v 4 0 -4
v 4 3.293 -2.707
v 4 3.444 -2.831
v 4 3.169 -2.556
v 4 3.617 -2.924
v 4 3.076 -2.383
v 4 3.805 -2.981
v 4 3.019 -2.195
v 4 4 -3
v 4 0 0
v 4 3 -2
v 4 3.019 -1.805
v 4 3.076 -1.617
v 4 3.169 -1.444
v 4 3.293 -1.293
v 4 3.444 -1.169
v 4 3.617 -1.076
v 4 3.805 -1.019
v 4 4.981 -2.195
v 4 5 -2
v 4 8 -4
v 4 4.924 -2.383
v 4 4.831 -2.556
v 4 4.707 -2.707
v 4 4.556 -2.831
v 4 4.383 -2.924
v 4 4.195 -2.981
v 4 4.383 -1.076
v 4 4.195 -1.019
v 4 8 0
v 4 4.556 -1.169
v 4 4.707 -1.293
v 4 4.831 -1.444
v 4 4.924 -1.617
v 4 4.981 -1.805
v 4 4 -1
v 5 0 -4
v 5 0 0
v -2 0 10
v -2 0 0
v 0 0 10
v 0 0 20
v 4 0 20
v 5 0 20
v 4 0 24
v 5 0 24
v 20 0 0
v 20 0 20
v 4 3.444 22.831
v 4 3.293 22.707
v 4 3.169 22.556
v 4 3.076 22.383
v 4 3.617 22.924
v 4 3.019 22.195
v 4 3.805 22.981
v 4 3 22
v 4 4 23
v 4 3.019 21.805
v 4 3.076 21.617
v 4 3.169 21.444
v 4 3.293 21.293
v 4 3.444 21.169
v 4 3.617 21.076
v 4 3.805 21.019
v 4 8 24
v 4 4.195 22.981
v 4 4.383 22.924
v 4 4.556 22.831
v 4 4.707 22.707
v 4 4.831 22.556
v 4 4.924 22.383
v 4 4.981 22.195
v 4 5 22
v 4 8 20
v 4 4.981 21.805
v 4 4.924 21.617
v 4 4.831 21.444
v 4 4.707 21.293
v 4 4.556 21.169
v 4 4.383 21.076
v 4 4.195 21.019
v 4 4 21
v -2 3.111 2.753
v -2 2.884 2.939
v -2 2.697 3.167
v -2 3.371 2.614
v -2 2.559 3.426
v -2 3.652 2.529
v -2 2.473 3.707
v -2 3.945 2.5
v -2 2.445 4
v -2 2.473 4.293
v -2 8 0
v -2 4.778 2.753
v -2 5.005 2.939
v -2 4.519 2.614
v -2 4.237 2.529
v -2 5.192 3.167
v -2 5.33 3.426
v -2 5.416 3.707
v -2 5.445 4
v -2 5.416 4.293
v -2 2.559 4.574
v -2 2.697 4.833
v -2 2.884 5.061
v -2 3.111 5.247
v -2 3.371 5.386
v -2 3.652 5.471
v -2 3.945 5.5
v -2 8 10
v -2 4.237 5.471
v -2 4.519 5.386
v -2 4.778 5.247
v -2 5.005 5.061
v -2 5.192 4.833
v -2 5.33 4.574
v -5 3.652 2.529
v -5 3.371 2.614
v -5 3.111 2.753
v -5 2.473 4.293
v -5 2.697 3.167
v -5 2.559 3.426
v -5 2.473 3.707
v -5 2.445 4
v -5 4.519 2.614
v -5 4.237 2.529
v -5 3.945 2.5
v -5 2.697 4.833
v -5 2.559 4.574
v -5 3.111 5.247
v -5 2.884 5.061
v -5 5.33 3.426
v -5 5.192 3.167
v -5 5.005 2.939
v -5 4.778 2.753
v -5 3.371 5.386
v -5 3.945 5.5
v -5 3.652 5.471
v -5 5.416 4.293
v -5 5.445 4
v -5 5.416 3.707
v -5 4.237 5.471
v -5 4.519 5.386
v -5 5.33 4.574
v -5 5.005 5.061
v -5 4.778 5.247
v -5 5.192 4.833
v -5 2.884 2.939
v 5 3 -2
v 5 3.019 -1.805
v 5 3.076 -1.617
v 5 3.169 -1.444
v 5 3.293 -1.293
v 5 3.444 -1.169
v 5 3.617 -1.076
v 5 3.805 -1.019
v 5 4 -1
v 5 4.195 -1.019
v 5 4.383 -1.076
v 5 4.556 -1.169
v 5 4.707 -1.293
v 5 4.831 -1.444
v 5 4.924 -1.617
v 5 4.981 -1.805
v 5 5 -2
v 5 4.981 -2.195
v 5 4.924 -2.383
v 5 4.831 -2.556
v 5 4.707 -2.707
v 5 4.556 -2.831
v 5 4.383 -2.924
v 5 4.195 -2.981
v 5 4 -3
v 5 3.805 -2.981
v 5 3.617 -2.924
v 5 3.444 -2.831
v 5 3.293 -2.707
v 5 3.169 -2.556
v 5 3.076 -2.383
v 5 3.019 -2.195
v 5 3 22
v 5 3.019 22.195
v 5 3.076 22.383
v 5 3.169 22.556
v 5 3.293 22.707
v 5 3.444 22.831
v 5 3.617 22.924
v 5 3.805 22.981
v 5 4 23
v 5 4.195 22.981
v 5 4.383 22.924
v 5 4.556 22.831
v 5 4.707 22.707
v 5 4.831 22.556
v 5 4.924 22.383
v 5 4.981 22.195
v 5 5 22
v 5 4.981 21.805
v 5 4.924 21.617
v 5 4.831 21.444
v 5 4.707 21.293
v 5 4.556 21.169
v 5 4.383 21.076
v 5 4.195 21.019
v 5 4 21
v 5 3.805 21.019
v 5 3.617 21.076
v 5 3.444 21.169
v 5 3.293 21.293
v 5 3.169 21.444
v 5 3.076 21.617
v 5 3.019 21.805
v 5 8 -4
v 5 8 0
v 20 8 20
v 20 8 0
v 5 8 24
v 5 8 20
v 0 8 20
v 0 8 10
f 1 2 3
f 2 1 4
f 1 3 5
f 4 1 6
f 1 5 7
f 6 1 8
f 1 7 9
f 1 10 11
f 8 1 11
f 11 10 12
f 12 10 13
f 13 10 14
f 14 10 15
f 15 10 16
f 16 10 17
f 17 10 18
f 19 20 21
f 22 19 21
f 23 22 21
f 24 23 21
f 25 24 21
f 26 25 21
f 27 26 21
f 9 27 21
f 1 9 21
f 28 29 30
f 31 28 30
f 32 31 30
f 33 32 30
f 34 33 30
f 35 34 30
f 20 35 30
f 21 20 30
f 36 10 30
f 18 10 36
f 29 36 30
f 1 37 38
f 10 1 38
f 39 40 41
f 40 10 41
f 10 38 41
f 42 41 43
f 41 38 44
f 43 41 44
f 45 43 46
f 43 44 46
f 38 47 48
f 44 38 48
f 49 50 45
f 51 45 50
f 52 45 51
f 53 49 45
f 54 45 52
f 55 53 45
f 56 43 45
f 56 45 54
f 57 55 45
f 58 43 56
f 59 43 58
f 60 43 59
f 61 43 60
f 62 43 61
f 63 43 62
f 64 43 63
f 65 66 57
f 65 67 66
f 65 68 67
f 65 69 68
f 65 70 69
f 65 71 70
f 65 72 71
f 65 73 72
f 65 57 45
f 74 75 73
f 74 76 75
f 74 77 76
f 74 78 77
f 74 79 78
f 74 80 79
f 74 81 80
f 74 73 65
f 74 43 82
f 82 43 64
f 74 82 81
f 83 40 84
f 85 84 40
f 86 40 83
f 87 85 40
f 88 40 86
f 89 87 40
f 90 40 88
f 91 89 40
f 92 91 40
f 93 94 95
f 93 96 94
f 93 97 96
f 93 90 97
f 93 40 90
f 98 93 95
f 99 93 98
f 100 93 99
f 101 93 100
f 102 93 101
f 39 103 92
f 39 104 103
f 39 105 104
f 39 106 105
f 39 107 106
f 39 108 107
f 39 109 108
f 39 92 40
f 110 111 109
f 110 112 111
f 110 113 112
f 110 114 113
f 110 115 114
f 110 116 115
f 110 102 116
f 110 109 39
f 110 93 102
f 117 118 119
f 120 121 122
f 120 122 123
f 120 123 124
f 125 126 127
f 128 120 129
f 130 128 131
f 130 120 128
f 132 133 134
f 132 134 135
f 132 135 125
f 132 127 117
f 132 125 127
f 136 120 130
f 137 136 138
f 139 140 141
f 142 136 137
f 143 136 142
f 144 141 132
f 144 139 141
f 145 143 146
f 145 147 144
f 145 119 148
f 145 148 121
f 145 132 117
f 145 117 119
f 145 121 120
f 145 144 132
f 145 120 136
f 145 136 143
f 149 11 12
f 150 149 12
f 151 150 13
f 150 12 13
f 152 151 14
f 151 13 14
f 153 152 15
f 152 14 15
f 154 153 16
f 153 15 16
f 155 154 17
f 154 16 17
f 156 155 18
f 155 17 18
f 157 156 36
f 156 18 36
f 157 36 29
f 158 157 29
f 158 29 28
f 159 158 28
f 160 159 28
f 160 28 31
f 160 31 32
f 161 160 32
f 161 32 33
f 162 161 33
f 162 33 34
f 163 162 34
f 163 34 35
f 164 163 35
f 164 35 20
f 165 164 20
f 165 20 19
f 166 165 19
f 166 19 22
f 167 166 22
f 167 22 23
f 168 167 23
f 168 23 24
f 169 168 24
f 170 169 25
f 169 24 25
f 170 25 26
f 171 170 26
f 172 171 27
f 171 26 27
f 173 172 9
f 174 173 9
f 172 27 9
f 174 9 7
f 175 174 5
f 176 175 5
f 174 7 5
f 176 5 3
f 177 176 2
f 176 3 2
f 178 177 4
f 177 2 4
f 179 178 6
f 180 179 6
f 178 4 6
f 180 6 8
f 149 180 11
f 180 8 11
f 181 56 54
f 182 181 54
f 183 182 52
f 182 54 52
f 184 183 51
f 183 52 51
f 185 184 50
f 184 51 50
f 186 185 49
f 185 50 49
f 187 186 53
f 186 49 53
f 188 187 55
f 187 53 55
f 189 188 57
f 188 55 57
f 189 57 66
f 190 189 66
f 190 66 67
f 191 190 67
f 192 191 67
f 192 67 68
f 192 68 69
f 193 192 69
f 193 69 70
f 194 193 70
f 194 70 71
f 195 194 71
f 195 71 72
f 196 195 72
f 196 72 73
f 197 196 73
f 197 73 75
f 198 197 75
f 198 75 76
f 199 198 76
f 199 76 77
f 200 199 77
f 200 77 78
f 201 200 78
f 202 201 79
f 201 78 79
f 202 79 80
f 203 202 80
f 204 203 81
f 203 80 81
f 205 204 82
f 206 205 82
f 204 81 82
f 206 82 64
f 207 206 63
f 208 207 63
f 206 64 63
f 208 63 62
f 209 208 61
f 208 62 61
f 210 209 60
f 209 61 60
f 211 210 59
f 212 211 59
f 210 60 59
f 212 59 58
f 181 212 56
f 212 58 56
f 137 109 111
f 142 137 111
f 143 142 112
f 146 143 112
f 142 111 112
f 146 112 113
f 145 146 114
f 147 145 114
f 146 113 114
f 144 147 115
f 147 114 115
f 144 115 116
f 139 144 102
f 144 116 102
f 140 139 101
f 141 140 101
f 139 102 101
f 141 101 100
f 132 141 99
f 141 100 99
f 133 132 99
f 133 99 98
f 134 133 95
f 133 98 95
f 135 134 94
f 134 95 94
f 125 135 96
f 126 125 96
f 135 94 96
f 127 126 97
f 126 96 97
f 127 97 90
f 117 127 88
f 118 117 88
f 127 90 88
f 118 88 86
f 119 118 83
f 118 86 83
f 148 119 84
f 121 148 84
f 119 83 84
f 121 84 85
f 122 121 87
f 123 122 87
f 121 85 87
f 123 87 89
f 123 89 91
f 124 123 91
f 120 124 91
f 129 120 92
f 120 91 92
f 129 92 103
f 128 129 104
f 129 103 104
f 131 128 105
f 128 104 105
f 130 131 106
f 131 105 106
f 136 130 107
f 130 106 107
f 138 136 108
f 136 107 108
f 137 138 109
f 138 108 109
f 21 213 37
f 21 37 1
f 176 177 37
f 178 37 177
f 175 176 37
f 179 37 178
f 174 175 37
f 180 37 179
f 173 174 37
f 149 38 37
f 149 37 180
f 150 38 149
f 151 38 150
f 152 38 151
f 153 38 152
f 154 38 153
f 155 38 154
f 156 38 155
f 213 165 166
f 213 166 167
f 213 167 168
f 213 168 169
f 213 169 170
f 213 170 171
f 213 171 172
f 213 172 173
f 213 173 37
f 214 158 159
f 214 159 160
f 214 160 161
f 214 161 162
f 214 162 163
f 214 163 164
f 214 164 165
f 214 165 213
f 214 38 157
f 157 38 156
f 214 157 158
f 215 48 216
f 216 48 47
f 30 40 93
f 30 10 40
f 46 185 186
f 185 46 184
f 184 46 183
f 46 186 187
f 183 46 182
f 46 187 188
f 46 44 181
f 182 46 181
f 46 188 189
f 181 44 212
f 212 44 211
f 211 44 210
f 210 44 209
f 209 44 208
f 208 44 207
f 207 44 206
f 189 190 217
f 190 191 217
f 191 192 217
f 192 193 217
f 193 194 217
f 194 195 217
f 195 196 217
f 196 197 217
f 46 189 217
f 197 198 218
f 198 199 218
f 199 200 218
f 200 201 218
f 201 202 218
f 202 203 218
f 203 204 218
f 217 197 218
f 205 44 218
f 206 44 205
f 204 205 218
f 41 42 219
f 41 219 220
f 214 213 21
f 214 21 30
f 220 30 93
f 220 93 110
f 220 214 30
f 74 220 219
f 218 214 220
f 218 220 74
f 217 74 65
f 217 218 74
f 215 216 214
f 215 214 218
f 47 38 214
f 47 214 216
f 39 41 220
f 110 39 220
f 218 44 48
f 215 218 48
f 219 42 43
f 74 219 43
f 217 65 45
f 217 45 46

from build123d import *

# Parameters (mm, degrees)
SKETCH1_W           = 20
SKETCH1_H           = 20
BOSS_EXTRUDE1_DEPTH = 8
SKETCH2_W           = 1
SKETCH2_H           = 8
BOSS_EXTRUDE2_DEPTH = 4
SKETCH3_W           = 1
SKETCH3_H           = 8
BOSS_EXTRUDE3_DEPTH = 4
SKETCH4_R           = 1
CUT_EXTRUDE1_DEPTH  = 4
SKETCH5_W           = 10
SKETCH5_H           = 8
BOSS_EXTRUDE4_DEPTH = 2
SKETCH6_R           = 1.5
BOSS_EXTRUDE5_DEPTH = 3


with BuildPart() as part:
    # Sketch1 → Boss-Extrude1 (new body)
    with BuildSketch(Plane(origin=(0, 0, 0), x_dir=(1, 0, 0), z_dir=(0, 1, 0))):
        with Locations((10, -10)):
            Rectangle(SKETCH1_W, SKETCH1_H)
    extrude(amount=BOSS_EXTRUDE1_DEPTH)

    # Sketch2 → Boss-Extrude2 (add)
    with BuildSketch(Plane(origin=(0, 0, 0), x_dir=(-1, 0, 0), z_dir=(0, 0, -1))):
        with Locations((-4.5, 4)):
            Rectangle(SKETCH2_W, SKETCH2_H)
    extrude(amount=BOSS_EXTRUDE2_DEPTH)

    # Sketch3 → Boss-Extrude3 (add)
    with BuildSketch(Plane.XY.offset(20)):
        with Locations((4.5, 4)):
            Rectangle(SKETCH3_W, SKETCH3_H)
    extrude(amount=BOSS_EXTRUDE3_DEPTH)

    # Sketch4 → Cut-Extrude1 (cut)
    with BuildSketch(Plane.ZY.offset(-4)):
        with Locations(Location((-2, 4, 0), (0, 0, 270))):
            Circle(SKETCH4_R)
        with Locations(Location((22, 4, 0), (0, 0, 270))):
            Circle(SKETCH4_R)
    extrude(amount=-CUT_EXTRUDE1_DEPTH, mode=Mode.SUBTRACT)

    # Sketch5 → Boss-Extrude4 (add)
    with BuildSketch(Plane.ZY):
        with Locations((5, 4)):
            Rectangle(SKETCH5_W, SKETCH5_H)
    extrude(amount=BOSS_EXTRUDE4_DEPTH)

    # Sketch6 → Boss-Extrude5 (add)
    with BuildSketch(Plane.ZY.offset(2)):
        with Locations((4, 3.944627207)):
            Circle(SKETCH6_R)
    extrude(amount=BOSS_EXTRUDE5_DEPTH)


solid = part.part
